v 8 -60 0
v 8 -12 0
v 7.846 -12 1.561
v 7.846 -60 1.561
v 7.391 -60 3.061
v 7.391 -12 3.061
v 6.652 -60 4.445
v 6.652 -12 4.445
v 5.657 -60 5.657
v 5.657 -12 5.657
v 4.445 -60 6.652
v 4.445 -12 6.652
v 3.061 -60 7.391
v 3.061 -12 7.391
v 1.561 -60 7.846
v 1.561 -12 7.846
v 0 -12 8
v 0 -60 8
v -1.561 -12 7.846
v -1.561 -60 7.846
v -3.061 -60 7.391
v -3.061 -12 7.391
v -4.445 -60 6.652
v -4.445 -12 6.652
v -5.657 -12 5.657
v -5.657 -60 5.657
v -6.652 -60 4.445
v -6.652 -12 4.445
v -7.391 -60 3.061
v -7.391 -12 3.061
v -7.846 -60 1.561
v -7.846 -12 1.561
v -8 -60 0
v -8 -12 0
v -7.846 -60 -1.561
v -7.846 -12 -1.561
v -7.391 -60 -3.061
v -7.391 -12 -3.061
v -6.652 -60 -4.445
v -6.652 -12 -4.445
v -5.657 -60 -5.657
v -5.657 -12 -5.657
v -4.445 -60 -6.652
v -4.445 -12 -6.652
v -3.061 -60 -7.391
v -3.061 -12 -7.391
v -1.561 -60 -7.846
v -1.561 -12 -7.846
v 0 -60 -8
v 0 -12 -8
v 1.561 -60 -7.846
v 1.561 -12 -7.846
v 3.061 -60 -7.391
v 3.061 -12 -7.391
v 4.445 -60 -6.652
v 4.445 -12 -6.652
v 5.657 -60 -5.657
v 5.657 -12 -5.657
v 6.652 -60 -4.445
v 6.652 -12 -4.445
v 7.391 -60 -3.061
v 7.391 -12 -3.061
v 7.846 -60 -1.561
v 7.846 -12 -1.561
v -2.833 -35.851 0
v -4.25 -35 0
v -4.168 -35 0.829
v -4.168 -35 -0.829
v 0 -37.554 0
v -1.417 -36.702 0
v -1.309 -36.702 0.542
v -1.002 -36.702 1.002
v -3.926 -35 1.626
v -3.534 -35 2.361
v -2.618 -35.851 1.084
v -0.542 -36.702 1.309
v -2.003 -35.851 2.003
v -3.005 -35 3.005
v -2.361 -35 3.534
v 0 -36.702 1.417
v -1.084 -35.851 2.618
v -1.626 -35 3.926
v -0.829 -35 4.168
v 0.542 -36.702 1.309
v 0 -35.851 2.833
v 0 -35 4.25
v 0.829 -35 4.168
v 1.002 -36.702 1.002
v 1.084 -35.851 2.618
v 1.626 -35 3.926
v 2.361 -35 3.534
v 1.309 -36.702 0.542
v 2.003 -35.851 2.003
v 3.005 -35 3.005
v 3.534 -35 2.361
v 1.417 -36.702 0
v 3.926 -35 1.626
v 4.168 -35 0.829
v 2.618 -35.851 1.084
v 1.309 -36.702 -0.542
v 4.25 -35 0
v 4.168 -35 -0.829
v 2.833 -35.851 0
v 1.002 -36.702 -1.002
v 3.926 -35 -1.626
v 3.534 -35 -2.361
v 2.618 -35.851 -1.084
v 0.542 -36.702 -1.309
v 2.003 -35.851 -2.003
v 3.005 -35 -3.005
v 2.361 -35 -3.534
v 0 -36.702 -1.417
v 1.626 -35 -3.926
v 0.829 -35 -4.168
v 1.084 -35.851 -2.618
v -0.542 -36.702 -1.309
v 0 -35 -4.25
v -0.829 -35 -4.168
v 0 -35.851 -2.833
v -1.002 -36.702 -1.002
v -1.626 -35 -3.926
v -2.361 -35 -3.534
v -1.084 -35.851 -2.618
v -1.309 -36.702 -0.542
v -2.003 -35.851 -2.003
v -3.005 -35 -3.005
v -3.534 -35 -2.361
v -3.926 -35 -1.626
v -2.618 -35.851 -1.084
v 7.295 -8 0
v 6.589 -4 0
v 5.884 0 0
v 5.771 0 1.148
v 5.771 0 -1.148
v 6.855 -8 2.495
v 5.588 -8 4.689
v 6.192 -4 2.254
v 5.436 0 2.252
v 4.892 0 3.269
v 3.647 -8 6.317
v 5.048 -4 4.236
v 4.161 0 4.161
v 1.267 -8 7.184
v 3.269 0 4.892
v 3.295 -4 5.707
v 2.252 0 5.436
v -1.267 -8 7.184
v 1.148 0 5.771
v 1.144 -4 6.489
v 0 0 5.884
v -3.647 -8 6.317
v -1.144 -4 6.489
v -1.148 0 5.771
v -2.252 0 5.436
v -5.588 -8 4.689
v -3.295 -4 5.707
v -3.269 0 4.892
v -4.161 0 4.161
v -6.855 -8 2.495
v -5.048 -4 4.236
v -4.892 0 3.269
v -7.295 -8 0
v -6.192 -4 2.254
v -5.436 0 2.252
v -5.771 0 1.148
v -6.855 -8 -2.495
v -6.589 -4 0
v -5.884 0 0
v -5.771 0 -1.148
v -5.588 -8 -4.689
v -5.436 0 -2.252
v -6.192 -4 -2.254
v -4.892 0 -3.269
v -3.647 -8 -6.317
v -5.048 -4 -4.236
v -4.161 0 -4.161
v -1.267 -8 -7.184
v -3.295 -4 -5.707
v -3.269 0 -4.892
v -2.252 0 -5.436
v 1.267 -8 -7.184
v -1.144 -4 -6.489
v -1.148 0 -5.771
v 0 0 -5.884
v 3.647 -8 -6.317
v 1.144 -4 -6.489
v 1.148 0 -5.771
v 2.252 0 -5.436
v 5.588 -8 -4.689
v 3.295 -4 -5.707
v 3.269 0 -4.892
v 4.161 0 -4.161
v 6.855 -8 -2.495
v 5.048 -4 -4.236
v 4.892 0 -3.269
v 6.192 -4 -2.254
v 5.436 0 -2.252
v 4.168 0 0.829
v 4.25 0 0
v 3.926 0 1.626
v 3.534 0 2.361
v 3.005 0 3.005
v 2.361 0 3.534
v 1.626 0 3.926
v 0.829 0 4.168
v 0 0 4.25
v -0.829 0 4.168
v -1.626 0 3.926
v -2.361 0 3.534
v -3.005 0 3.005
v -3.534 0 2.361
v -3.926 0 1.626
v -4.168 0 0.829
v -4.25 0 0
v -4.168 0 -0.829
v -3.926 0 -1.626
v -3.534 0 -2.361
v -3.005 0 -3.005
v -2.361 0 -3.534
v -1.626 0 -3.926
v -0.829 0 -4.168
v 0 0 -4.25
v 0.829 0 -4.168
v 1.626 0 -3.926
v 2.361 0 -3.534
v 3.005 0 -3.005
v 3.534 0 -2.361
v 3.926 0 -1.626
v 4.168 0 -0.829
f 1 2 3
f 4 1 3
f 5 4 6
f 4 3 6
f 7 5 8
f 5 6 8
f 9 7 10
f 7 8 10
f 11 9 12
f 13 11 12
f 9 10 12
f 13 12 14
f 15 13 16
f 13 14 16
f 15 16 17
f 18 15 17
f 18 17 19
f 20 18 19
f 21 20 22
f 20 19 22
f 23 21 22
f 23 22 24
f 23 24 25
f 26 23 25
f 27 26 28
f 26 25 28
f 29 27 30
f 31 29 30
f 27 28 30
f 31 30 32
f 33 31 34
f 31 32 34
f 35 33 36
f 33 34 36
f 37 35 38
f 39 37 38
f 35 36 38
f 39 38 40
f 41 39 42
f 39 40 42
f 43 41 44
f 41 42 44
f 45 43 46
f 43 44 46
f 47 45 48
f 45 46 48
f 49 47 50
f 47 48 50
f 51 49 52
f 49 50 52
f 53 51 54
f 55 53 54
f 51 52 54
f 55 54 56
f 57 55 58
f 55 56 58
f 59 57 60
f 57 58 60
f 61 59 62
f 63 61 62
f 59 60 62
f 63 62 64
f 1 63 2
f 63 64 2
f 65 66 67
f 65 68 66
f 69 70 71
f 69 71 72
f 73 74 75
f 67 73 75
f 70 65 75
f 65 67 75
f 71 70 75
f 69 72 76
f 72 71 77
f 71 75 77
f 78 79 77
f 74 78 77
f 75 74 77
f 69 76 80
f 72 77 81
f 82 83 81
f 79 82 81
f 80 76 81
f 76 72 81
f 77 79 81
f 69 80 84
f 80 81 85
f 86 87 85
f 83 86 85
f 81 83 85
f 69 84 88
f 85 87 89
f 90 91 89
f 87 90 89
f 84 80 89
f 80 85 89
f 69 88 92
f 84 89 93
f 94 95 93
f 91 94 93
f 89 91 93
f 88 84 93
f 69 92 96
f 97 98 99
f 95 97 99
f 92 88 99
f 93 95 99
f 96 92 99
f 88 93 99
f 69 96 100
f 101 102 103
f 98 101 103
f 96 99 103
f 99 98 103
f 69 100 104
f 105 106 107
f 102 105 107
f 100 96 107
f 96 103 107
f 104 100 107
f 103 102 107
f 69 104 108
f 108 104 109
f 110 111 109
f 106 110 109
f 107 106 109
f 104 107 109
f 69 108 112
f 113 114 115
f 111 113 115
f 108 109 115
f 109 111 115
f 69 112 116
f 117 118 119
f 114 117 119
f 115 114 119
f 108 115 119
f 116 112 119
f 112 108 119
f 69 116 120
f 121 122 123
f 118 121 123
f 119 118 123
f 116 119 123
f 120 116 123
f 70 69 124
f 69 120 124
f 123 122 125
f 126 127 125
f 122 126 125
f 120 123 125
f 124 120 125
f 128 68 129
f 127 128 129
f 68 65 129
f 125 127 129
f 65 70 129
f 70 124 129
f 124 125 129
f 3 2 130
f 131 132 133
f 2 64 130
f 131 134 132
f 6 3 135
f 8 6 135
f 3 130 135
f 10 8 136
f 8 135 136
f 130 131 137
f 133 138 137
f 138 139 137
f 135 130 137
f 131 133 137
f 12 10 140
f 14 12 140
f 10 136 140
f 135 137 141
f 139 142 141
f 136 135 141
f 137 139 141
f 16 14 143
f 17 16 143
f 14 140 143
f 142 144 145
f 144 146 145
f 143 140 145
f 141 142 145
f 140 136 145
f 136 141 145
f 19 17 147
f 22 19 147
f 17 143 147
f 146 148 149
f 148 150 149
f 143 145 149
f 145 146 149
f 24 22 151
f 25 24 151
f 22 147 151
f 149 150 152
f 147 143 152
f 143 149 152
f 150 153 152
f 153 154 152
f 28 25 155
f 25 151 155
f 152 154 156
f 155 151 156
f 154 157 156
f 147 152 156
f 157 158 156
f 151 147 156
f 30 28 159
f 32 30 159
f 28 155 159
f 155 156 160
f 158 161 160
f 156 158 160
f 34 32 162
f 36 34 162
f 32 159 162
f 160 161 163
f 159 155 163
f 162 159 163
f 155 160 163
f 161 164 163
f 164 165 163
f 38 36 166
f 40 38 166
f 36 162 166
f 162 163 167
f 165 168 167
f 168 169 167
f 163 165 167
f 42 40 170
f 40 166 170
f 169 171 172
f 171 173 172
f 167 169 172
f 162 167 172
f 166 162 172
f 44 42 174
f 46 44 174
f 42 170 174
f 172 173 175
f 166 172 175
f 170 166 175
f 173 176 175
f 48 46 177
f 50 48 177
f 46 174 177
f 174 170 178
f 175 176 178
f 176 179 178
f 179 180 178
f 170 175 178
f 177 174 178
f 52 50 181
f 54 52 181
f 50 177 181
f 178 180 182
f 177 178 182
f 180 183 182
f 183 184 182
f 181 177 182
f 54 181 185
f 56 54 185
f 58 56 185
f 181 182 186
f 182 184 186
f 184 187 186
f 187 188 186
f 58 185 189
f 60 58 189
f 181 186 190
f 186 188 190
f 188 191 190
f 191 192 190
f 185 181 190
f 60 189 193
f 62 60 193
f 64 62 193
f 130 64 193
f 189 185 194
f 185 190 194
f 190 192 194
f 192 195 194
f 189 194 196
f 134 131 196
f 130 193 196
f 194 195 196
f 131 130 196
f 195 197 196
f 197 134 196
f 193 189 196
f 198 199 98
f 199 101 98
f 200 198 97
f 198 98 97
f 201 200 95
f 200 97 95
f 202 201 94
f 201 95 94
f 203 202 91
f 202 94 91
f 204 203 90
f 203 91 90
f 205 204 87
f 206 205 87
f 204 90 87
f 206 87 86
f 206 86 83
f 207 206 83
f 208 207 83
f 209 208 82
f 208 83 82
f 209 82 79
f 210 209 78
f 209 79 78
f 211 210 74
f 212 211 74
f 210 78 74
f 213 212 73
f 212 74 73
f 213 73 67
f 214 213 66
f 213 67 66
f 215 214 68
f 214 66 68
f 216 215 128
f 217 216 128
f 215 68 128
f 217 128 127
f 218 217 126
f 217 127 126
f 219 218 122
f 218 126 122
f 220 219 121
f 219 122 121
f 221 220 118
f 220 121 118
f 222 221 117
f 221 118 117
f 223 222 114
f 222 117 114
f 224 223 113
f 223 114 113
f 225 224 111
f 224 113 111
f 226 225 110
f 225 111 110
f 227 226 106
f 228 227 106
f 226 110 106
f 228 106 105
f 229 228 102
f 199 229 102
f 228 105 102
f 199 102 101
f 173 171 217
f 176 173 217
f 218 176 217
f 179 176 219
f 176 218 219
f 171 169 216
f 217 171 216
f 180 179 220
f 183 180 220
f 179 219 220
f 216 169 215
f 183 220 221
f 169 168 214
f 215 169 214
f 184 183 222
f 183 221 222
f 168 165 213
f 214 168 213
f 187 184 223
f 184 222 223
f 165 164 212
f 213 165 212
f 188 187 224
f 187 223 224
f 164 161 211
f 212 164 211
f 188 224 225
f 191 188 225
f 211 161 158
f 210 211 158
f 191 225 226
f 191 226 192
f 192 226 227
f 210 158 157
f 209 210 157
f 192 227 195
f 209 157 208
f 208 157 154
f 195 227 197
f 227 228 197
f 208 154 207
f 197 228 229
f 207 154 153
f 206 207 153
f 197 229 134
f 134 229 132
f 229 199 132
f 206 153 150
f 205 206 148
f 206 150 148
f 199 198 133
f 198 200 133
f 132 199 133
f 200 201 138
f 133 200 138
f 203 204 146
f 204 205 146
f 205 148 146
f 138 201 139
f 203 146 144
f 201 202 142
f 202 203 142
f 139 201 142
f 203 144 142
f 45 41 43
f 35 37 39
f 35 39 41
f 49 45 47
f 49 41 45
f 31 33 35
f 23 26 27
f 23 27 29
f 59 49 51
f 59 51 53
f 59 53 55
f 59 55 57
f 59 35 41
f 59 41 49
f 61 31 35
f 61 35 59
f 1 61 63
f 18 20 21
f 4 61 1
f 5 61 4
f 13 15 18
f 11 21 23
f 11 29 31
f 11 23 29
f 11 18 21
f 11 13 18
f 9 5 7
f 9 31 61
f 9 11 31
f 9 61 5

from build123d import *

# Parameters (mm, degrees)
F0_R     = 8
F1_DEPTH = 60
F3_D     = 8.5
F3_DEPTH = 35
F3_TIP   = 2.5536576309
F4_SIZE2 = 2.1159237685
F4_SIZE  = 12


with BuildPart() as f1:
    # F0 (on Front) → F1 (new body)
    with BuildSketch(Plane.XZ):
        Circle(F0_R)
    extrude(amount=F1_DEPTH)

    # F3
    with Locations(Plane(origin=(0, 0, 0), x_dir=(-1, 0, 0), z_dir=(0, 1, 0))):
        with Locations((0, 0)):
            Hole(F3_D / 2, depth=F3_DEPTH)
            with Locations((0, 0, -(F3_DEPTH + F3_TIP / 2))):  # 118° drill point
                Cone(0, F3_D / 2, F3_TIP, mode=Mode.SUBTRACT)

    # F4
    f4_edges = [f1.edges().sort_by_distance(p)[0] for p in [
        (-8, 0, 0),
    ]]
    f4_side = f1.faces().sort_by_distance((-8, -30, 0))[0]
    chamfer(f4_edges, length=F4_SIZE, length2=F4_SIZE2, reference=f4_side)


solid = f1.part
